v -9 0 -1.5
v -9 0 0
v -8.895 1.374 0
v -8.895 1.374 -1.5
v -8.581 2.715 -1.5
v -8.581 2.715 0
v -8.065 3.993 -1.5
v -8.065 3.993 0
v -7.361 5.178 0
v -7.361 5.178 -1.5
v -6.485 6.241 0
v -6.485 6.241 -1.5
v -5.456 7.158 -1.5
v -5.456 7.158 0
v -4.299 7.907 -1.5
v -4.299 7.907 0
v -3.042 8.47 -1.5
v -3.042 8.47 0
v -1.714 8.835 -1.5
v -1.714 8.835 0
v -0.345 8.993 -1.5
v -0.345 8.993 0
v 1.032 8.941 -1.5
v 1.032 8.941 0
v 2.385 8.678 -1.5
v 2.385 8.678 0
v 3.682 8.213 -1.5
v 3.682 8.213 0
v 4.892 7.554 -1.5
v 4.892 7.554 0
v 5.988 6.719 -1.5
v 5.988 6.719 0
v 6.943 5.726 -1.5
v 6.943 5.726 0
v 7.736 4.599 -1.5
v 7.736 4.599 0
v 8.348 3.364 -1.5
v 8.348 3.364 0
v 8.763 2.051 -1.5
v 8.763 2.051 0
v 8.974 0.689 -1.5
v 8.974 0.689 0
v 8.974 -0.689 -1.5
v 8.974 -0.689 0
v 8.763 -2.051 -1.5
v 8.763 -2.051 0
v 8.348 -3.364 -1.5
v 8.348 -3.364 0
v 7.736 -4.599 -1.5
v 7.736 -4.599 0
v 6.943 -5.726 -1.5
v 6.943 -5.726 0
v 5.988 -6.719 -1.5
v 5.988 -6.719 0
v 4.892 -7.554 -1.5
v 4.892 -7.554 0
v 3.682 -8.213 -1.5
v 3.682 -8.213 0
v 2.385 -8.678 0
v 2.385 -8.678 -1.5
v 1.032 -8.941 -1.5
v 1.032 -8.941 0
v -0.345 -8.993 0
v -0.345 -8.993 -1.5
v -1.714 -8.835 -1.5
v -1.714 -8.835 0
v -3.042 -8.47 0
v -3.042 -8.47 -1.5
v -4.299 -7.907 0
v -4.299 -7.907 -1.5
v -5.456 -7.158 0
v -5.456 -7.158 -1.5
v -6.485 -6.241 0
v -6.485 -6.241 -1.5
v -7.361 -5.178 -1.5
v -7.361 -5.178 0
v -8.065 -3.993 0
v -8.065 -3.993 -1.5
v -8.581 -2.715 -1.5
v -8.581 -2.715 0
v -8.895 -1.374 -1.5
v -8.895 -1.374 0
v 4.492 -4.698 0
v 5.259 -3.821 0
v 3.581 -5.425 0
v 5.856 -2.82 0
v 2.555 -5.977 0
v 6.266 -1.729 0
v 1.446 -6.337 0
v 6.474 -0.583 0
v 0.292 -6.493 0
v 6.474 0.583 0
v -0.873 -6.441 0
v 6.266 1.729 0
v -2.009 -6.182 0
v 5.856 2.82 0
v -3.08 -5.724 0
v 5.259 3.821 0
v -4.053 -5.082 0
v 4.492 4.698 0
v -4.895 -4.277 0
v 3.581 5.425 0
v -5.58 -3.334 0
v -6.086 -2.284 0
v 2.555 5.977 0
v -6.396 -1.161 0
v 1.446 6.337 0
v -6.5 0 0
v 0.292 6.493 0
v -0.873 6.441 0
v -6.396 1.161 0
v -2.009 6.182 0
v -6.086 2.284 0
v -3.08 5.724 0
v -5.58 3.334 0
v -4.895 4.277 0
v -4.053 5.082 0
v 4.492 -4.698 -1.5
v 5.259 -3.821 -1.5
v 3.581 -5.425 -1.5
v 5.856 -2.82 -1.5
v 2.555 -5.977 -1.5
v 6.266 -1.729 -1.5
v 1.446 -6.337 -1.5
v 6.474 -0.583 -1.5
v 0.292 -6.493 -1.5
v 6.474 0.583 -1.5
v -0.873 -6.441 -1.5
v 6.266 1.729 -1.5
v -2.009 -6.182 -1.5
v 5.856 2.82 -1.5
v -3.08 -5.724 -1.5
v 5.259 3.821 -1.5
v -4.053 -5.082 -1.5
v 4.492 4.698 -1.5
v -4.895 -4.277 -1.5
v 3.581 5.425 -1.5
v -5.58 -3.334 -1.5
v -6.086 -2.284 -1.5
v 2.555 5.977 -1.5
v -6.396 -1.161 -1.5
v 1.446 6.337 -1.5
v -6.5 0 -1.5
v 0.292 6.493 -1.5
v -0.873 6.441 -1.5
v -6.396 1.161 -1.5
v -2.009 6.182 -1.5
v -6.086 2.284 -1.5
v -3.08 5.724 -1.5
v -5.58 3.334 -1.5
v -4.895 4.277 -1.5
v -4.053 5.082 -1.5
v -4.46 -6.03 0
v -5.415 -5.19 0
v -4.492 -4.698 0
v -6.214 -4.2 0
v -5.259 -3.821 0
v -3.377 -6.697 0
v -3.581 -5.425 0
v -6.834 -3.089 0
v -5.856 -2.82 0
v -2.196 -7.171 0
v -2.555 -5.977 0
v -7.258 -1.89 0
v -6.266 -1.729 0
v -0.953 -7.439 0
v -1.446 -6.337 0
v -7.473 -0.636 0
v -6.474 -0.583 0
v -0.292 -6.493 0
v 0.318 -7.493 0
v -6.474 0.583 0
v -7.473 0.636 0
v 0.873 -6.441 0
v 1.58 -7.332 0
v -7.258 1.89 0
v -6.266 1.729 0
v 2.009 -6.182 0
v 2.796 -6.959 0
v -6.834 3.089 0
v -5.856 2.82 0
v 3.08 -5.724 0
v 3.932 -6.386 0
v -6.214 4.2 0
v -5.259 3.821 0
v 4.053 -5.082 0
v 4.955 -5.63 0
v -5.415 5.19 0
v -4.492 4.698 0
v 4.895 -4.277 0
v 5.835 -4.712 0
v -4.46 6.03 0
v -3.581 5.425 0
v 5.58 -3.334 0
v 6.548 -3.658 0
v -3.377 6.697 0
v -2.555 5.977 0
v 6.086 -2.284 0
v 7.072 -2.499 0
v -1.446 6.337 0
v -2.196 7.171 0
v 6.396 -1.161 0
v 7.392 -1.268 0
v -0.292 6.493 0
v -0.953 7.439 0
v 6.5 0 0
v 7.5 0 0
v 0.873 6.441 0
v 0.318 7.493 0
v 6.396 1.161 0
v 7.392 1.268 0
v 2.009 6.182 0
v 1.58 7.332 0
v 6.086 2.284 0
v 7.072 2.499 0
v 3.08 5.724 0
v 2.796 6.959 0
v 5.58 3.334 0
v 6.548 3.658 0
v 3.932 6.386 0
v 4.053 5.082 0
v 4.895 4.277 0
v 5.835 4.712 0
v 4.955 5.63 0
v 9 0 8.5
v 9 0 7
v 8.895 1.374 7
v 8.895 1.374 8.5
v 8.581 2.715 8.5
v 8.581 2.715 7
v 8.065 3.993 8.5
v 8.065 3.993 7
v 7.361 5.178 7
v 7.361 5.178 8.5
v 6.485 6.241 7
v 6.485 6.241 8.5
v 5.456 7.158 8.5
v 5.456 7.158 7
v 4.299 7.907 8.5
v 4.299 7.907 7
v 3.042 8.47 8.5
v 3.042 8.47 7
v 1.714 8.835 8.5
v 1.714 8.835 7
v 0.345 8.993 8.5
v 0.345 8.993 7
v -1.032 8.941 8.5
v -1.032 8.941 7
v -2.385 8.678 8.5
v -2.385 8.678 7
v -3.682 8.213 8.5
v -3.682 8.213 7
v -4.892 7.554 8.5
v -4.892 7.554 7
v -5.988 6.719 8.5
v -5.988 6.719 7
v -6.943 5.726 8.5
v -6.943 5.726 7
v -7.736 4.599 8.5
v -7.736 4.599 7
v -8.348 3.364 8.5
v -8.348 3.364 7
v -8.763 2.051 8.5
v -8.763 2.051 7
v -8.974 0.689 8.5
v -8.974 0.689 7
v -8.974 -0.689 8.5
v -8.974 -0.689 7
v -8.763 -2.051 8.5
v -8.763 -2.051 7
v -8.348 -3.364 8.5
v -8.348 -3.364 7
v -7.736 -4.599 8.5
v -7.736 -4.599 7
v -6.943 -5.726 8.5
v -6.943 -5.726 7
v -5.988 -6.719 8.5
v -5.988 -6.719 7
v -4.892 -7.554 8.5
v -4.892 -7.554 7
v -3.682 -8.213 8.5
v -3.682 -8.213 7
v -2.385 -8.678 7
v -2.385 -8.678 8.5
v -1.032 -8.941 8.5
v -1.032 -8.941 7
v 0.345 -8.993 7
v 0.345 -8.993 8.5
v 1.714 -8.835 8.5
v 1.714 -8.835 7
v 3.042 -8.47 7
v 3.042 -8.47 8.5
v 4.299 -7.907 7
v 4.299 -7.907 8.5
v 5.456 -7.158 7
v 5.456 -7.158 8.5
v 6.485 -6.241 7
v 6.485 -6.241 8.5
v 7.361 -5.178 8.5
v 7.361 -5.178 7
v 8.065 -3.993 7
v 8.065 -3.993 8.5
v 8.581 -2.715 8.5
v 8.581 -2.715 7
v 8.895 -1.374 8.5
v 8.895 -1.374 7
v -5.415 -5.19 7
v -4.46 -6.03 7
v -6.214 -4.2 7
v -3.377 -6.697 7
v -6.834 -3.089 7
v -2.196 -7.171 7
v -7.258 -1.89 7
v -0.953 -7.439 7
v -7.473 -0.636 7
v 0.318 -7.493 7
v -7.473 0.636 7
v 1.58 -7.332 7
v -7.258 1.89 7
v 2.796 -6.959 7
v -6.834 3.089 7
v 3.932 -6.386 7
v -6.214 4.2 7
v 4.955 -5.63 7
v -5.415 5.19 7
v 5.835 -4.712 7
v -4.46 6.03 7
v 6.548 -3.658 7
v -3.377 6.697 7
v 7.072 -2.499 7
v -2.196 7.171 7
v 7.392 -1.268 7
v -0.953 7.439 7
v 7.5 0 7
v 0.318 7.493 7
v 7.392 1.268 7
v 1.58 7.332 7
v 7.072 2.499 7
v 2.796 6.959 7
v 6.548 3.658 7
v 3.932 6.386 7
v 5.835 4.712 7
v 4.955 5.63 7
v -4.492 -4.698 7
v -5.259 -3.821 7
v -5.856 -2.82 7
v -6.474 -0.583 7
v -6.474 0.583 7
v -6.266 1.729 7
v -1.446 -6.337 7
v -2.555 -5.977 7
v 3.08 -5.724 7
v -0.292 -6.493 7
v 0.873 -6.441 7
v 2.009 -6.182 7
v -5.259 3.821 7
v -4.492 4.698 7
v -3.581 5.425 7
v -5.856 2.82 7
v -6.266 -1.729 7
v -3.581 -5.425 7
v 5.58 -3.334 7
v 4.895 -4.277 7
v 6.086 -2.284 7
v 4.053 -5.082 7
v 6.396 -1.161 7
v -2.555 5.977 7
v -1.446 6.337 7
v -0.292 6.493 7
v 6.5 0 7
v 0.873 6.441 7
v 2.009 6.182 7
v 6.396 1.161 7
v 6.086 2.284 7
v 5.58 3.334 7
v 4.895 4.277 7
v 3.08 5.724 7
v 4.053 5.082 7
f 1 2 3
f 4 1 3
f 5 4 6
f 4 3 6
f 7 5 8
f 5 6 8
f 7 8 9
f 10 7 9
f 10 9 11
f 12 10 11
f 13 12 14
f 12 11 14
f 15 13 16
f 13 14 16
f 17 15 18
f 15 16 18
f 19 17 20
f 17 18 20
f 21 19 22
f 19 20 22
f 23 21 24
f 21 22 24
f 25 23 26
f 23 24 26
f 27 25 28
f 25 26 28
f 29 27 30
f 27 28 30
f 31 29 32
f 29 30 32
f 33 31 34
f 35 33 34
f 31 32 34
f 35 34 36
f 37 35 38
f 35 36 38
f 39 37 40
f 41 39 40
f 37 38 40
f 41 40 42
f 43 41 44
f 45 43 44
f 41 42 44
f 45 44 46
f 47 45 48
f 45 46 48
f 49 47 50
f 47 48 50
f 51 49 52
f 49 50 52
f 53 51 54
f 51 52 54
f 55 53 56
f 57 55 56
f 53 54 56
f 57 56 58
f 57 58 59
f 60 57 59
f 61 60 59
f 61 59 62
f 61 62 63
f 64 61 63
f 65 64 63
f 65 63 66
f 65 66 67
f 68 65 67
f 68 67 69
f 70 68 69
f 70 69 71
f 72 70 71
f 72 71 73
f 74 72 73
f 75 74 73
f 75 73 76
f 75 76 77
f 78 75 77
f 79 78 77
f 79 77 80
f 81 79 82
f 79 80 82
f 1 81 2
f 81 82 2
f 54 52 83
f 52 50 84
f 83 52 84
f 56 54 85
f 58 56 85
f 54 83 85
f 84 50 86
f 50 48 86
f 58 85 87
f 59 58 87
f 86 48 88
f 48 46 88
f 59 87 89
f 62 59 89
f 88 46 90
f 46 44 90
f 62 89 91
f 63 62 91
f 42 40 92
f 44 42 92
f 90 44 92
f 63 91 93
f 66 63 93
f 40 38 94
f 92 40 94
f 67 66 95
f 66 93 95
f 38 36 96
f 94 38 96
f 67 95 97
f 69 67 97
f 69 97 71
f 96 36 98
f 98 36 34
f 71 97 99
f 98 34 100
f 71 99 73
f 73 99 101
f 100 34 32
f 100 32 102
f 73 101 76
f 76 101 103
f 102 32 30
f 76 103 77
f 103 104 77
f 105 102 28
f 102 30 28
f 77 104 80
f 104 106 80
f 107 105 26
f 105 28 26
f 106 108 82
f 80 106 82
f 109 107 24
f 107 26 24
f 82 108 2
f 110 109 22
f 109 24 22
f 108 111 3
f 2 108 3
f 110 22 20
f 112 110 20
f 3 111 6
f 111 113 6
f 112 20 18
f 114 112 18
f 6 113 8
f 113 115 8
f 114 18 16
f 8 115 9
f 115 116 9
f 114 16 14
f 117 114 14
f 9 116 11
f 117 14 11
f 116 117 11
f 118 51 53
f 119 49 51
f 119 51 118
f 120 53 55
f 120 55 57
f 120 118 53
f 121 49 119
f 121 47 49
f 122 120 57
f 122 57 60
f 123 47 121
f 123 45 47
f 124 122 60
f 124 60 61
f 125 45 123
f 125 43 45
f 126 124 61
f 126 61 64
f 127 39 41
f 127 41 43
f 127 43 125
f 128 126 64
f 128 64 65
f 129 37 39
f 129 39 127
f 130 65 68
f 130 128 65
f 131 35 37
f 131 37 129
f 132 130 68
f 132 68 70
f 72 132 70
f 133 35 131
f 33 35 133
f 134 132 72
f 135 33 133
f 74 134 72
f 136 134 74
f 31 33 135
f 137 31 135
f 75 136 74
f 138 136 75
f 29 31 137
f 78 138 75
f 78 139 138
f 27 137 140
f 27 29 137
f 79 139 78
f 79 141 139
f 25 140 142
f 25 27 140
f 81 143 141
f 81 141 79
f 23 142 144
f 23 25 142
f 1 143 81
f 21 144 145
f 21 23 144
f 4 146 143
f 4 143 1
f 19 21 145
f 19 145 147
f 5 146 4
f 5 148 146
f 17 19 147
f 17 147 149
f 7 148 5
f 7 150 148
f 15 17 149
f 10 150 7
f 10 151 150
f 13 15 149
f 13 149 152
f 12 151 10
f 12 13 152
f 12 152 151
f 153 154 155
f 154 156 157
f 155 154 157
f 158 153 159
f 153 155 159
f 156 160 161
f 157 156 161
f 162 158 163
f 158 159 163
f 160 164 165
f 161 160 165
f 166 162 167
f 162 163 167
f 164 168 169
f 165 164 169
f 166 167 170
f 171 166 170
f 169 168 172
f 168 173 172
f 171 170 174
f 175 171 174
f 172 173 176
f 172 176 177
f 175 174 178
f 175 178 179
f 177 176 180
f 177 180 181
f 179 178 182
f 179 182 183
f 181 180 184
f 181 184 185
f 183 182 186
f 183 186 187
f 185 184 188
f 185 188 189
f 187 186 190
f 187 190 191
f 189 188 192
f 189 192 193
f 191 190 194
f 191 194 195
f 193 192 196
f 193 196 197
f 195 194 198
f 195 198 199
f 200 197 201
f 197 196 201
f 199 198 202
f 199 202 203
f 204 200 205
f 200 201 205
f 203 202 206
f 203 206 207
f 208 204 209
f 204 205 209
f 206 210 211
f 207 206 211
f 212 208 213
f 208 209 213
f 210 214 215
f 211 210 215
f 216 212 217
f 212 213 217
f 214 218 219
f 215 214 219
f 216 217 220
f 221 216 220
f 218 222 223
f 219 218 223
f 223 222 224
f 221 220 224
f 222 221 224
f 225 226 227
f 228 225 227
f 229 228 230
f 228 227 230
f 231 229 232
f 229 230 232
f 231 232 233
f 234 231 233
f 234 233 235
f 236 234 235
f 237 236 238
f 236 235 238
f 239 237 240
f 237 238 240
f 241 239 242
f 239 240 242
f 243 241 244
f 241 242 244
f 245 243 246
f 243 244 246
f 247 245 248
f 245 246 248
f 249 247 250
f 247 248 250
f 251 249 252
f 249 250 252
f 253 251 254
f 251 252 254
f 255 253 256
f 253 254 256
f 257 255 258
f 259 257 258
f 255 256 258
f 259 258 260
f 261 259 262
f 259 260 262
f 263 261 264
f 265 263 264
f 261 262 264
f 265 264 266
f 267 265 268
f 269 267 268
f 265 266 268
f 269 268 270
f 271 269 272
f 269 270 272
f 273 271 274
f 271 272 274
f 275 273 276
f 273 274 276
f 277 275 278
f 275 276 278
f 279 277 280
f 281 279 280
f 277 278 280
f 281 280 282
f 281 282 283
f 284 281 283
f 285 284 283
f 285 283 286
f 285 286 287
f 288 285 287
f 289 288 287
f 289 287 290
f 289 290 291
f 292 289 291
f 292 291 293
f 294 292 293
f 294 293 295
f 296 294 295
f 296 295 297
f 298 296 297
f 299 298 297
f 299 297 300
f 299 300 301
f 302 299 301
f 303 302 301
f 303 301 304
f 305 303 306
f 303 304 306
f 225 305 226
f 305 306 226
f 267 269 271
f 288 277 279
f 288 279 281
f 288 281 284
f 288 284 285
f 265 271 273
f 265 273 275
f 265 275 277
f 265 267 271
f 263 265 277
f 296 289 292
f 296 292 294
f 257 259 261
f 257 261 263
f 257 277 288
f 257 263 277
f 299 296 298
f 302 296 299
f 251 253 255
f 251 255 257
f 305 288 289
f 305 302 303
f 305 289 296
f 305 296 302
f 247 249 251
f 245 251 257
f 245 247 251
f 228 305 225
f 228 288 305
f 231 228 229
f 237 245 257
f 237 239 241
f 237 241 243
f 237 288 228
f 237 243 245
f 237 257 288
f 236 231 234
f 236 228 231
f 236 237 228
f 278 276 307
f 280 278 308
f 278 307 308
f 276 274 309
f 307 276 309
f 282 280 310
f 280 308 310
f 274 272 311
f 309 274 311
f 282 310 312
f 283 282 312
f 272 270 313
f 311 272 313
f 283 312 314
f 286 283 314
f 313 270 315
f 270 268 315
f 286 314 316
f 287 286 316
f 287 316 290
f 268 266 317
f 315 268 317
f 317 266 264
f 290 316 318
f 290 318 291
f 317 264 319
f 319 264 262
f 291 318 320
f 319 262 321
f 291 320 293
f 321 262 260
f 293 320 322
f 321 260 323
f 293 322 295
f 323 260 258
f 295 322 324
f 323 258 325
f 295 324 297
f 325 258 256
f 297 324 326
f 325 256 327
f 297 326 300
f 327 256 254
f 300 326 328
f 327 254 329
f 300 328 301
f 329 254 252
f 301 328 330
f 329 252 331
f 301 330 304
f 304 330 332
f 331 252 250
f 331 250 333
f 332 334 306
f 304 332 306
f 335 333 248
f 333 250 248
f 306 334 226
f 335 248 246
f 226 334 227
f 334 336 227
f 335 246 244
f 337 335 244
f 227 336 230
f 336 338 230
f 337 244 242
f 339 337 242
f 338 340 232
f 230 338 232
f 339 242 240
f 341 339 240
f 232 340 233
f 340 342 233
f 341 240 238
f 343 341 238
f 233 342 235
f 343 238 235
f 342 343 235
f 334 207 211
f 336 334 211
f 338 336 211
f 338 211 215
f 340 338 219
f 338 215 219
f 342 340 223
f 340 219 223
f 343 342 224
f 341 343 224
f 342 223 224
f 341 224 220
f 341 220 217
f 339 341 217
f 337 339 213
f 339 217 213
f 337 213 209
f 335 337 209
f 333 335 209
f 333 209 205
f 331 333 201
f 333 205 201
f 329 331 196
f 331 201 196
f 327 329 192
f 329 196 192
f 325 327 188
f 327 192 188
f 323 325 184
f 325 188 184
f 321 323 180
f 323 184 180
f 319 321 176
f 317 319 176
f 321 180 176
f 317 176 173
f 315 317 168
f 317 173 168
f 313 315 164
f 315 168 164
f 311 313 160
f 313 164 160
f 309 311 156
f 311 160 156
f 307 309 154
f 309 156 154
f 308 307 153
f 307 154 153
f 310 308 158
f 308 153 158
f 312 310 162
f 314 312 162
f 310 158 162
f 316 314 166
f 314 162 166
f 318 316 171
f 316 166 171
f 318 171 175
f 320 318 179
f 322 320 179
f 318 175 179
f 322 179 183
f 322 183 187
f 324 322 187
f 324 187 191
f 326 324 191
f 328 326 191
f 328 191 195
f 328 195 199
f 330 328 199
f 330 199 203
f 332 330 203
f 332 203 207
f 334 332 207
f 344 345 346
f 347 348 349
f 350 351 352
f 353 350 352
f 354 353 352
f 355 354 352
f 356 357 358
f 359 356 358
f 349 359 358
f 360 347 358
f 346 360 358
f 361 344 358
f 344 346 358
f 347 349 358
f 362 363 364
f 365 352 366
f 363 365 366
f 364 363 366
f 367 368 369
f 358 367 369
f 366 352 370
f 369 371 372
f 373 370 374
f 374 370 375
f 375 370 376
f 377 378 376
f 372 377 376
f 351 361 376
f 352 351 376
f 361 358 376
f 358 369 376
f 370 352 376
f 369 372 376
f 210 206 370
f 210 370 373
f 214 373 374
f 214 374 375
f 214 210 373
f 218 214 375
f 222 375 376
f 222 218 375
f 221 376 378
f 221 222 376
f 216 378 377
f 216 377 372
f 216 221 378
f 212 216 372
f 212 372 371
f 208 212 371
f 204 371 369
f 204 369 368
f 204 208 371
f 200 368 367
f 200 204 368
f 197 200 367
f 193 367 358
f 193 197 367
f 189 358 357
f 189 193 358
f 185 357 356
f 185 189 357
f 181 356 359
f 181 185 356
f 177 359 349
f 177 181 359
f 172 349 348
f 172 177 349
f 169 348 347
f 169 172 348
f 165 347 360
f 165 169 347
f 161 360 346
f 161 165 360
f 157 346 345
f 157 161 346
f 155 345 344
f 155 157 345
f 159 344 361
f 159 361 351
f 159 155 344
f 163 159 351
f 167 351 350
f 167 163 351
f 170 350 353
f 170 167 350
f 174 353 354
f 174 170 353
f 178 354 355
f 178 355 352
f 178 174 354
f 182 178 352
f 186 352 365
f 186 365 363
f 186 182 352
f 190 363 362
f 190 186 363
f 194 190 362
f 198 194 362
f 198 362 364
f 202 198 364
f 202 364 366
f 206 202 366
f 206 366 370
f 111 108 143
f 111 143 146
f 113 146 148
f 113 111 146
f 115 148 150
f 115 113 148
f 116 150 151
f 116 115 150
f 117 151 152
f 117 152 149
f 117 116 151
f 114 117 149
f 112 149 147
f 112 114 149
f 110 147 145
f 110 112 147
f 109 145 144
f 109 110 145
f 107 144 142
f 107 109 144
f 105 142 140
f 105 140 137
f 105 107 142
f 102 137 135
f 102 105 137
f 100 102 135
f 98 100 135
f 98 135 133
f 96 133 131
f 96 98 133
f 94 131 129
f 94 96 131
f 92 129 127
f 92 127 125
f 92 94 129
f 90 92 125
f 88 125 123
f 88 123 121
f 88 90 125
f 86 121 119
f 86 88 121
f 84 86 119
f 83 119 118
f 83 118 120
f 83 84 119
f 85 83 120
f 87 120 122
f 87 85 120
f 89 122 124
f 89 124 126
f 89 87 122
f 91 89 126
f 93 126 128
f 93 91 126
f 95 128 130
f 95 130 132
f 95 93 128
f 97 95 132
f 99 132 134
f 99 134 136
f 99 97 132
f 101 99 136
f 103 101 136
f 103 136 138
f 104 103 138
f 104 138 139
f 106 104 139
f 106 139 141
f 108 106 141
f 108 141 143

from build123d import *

# Parameters (mm, degrees)
SKETCH1_R           = 7.5
SKETCH1_R_2         = 6.5
BOSS_EXTRUDE2_DEPTH = 7
SKETCH3_R           = 9
BOSS_EXTRUDE3_DEPTH = 1.5
SKETCH4_R           = 9
SKETCH4_R_2         = 6.5
BOSS_EXTRUDE4_DEPTH = 1.5


with BuildPart() as part:
    # Sketch1 → Boss-Extrude2 (new body)
    with BuildSketch(Plane.XY):
        Circle(SKETCH1_R)
        Circle(SKETCH1_R_2, mode=Mode.SUBTRACT)
    extrude(amount=BOSS_EXTRUDE2_DEPTH)

    # Sketch3 → Boss-Extrude3 (add)
    with BuildSketch(Plane.XY.offset(7)):
        Circle(SKETCH3_R)
    extrude(amount=BOSS_EXTRUDE3_DEPTH)


with BuildPart() as body_2:
    # Sketch4 → Boss-Extrude4 (new body)
    with BuildSketch(Plane(origin=(0, 0, 0), x_dir=(-1, 0, 0), z_dir=(0, 0, -1))):
        Circle(SKETCH4_R)
        Circle(SKETCH4_R_2, mode=Mode.SUBTRACT)
    extrude(amount=BOSS_EXTRUDE4_DEPTH)


solid = Compound([part.part, body_2.part])
